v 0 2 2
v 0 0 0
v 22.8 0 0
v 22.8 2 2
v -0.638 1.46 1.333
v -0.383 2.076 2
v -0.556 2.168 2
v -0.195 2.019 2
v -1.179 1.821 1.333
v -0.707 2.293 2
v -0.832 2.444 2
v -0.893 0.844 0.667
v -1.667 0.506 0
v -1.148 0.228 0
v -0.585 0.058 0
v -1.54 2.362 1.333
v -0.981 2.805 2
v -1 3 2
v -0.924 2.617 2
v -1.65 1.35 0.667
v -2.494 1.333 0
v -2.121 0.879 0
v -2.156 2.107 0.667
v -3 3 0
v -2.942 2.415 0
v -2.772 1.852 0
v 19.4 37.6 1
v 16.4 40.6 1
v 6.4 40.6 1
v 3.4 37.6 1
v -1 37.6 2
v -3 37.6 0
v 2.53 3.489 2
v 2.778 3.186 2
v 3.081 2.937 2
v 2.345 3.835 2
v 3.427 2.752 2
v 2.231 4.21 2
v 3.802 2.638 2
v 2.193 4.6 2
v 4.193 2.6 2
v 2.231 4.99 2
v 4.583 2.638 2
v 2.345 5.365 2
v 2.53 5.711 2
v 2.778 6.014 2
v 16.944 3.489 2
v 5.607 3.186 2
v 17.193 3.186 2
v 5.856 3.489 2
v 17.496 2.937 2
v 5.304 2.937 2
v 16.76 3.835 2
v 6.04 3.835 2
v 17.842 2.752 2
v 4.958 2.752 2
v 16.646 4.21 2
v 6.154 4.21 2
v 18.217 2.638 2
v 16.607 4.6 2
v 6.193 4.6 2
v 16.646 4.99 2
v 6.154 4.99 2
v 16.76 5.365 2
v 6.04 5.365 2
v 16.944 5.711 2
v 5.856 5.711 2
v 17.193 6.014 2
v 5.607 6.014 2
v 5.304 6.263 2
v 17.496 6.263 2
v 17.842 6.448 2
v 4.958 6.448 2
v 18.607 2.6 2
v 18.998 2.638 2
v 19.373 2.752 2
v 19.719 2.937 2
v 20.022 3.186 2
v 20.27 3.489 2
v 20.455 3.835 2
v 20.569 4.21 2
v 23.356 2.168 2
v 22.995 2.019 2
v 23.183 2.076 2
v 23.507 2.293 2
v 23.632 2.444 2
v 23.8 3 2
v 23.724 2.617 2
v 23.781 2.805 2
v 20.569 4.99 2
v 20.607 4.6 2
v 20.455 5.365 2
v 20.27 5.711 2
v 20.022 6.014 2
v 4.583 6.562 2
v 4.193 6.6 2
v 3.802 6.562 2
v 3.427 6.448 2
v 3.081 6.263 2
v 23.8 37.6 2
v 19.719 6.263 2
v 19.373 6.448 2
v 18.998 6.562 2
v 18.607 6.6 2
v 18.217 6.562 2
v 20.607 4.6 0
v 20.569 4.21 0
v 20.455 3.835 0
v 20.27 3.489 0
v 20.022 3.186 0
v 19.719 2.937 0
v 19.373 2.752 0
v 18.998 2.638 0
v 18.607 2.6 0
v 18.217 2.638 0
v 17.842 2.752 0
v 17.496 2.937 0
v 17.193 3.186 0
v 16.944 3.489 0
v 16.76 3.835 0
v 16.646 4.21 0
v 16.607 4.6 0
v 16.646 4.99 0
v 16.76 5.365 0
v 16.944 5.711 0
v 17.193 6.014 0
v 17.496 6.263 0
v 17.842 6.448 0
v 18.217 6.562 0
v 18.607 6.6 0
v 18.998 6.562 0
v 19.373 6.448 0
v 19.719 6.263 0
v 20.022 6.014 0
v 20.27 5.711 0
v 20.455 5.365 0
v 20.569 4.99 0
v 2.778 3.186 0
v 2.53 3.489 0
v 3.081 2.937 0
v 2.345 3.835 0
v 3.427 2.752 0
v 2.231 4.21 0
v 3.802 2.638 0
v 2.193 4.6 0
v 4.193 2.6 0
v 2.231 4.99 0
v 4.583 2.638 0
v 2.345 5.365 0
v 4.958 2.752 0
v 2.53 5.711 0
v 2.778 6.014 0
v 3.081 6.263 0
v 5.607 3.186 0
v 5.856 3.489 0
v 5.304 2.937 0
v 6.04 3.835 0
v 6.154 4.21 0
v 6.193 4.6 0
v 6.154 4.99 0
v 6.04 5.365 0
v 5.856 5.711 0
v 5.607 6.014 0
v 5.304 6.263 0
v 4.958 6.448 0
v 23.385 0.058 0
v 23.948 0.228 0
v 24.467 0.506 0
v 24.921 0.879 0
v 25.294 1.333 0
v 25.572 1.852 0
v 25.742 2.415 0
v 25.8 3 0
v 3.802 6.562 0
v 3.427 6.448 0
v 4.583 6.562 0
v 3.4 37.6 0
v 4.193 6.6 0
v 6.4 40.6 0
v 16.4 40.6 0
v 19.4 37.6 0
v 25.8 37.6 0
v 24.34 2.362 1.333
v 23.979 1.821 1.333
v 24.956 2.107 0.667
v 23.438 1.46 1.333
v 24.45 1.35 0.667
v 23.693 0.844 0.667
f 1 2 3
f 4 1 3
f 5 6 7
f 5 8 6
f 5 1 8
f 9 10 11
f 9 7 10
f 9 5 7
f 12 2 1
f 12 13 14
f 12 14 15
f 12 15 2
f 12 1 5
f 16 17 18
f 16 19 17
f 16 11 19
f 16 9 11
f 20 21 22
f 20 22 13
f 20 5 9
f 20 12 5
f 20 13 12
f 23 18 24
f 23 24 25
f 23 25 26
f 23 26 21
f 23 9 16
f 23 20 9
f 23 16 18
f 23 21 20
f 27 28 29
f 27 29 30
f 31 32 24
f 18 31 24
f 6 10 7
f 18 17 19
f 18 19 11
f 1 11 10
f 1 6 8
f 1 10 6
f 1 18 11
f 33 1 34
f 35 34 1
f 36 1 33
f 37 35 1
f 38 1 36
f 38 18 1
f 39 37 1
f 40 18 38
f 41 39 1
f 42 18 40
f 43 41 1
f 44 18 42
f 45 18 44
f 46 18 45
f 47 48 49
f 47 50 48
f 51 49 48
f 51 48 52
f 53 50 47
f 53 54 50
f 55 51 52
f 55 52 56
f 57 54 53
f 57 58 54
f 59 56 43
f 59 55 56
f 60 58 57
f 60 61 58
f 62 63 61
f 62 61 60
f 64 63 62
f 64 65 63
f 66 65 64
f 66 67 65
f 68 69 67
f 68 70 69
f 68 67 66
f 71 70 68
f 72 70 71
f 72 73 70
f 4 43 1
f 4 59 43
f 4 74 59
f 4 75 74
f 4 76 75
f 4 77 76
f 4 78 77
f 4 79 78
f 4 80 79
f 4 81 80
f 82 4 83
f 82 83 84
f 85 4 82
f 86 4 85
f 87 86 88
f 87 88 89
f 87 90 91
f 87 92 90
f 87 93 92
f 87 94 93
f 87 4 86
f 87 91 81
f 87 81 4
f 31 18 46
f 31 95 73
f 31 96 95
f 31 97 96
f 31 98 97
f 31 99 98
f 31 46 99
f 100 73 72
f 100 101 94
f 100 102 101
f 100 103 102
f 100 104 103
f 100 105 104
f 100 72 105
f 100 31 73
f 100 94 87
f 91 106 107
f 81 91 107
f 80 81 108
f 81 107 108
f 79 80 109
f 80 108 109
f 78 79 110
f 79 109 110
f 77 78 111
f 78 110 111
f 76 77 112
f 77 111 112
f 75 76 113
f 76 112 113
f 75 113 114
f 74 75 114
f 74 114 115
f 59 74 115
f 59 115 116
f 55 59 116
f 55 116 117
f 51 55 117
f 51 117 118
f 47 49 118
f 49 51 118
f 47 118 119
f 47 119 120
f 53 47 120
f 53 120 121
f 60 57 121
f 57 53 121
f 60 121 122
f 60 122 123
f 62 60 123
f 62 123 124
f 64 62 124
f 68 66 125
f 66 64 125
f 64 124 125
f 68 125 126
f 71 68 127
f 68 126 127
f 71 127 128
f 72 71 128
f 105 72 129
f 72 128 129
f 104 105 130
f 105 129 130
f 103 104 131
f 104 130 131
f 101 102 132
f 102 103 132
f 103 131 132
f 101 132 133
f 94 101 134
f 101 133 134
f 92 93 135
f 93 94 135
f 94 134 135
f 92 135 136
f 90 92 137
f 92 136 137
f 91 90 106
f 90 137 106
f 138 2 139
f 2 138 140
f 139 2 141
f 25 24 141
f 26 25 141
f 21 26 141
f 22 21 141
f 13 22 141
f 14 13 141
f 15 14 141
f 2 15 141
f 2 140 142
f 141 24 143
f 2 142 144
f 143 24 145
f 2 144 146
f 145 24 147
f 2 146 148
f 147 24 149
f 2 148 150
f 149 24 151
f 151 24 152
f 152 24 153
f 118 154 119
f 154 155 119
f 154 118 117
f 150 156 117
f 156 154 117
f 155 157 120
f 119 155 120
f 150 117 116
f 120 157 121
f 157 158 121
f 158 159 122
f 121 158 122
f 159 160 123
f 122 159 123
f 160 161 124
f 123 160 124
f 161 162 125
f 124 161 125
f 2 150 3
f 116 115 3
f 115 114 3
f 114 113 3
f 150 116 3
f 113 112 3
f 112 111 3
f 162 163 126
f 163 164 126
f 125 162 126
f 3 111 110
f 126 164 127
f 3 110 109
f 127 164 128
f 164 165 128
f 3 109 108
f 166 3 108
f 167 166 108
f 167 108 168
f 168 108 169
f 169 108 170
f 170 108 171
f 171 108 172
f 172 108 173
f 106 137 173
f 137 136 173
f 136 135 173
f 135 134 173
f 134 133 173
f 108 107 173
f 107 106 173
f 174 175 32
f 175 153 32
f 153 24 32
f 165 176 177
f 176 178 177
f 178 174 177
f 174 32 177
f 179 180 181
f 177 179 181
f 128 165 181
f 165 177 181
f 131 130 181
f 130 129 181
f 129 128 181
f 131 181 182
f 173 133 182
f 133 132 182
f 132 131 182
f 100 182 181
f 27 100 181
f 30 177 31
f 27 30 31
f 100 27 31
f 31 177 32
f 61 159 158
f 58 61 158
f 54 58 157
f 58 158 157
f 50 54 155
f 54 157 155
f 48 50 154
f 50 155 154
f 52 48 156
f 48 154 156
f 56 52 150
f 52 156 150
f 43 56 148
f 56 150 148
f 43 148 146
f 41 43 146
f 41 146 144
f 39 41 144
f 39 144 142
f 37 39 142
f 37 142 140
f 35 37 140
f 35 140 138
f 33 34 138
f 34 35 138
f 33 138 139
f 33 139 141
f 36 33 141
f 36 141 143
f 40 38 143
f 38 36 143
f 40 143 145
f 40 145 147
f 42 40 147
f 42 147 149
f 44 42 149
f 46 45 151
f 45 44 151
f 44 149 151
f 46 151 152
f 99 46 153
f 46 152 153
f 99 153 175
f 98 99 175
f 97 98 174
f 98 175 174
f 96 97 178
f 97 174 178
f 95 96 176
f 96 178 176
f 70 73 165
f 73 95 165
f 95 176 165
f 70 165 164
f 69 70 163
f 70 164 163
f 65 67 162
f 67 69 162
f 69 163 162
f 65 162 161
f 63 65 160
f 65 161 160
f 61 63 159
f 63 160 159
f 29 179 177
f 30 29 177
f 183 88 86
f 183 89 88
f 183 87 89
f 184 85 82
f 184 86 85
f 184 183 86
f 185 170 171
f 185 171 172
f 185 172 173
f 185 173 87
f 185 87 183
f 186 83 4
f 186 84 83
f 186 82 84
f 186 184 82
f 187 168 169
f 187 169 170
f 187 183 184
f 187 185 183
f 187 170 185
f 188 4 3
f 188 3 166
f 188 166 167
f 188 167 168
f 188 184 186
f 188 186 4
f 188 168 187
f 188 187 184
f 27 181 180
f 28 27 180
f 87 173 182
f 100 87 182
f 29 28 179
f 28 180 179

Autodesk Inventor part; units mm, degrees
ref_plane "YZ Plane" through (0, 0, 0) normal (1, 0, 0) x (0, 1, 0)
ref_plane "XZ Plane" through (0, 0, 0) normal (0, 1, 0) x (-1, 0, 0)
ref_plane "XY Plane" through (0, 0, 0) normal (0, 0, 1) x (1, 0, 0)
sketch "Skizze1" plane through (0, 0, 0) normal (0, 0, 1) x (1, 0, 0)
  line L0 (3.4, 37.6) -> (-3, 37.6)
  line L1 (-3, 37.6) -> (-3, 3)
  arc A0 (-3, 3) -> (0, 0) centre (0, 3) ccw
  line L2 (0, 0) -> (22.8, 0)
  arc A1 (22.8, 0) -> (25.8, 3) centre (22.8, 3) ccw
  line L3 (25.8, 3) -> (25.8, 37.6)
  line L4 (25.8, 37.6) -> (19.4, 37.6)
  line L5 (19.4, 37.6) -> (16.4, 40.6)
  line L6 (16.4, 40.6) -> (6.4, 40.6)
  line L7 (6.4, 40.6) -> (3.4, 37.6)
  line L8 (-1.8, 35.6) -> (24.6, 35.6)
  line L9 (24.6, 35.6) -> (24.6, 9.2)
  line L10 (24.6, 9.2) -> (-1.8, 9.2)
  line L11 (-1.8, 9.2) -> (-1.8, 35.6)
  line L12 (24.6, 35.6) -> (-1.8, 35.6)
  line L13 (-1.8, 35.6) -> (-1.8, 9.2)
  line L14 (-1.8, 9.2) -> (24.6, 9.2)
  line L15 (24.6, 9.2) -> (24.6, 35.6)
  line L16 (24.6, 35.6) -> (-1.8, 35.6)
  line L17 (-3, 37.6) -> (3.4, 37.6)
  line L18 (-3, 3) -> (-3, 37.6)
  arc A2 (-3, 3) -> (0, 0) centre (0, 3) ccw
  line L19 (22.8, 0) -> (0, 0)
  arc A3 (22.8, 0) -> (25.8, 3) centre (22.8, 3) ccw
  line L20 (25.8, 37.6) -> (25.8, 3)
  line L21 (19.4, 37.6) -> (25.8, 37.6)
  line L22 (19.4, 37.6) -> (16.4, 40.6)
  line L23 (16.4, 40.6) -> (6.4, 40.6)
  line L24 (6.4, 40.6) -> (3.4, 37.6)
  circle A4 centre (4.1926, 4.6) radius 2
  line L25 (11.4, 35.6) -> (11.4, 0)
  circle A5 centre (18.6074, 4.6) radius 2
  point P0 (-3, 37.6)
  point P1 (-3, 3)
  point P2 (0, 0)
extrude "Extrusion1" add sketch "Skizze1" along normal blind 2 contours L7 L6 L5 L4 L3 A1 L2 A0 L1 L0 | L8 L25 L10 L11 | L8 L9 L10 L25
chamfer "Fase1" distance 2 angle 45 5 edges at (25.8, 20.3, 2) (24.9213, 0.8787, 2) (11.4, 0, 2) (-2.1213, 0.8787, 2) (-3, 20.3, 2)
sketch "Skizze2" plane through (0, 0, 2) normal (0, 0, 1) x (1, 0, 0)
  line L0 (-1, 3) -> (-1, 37.6) projected
  arc A0 (-1, 3) -> (0, 2) centre (0, 3) ccw projected
  line L1 (22.8, 2) -> (0, 2) projected
  arc A1 (22.8, 2) -> (23.8, 3) centre (22.8, 3) ccw projected
  line L2 (23.8, 37.6) -> (23.8, 3) projected
  line L3 (23.8, 37.6) -> (19.4, 37.6) projected
  line L4 (19.4, 37.6) -> (16.4, 40.6) projected
  line L5 (16.4, 40.6) -> (6.4, 40.6) projected
  line L6 (6.4, 40.6) -> (3.4, 37.6) projected
  line L7 (3.4, 37.6) -> (-1, 37.6) projected
  line L8 (6.4, 40.6) -> (3.4, 37.6) projected
  line L9 (3.4, 37.6) -> (19.4, 37.6)
  point P0 (0, 0)
extrude "Extrusion2" cut sketch "Skizze2" against normal blind 1 contours L6 L5 L4 L9
properties part number "OBS-MainCase-A-004_GPS-Cover_v0.1.1"
